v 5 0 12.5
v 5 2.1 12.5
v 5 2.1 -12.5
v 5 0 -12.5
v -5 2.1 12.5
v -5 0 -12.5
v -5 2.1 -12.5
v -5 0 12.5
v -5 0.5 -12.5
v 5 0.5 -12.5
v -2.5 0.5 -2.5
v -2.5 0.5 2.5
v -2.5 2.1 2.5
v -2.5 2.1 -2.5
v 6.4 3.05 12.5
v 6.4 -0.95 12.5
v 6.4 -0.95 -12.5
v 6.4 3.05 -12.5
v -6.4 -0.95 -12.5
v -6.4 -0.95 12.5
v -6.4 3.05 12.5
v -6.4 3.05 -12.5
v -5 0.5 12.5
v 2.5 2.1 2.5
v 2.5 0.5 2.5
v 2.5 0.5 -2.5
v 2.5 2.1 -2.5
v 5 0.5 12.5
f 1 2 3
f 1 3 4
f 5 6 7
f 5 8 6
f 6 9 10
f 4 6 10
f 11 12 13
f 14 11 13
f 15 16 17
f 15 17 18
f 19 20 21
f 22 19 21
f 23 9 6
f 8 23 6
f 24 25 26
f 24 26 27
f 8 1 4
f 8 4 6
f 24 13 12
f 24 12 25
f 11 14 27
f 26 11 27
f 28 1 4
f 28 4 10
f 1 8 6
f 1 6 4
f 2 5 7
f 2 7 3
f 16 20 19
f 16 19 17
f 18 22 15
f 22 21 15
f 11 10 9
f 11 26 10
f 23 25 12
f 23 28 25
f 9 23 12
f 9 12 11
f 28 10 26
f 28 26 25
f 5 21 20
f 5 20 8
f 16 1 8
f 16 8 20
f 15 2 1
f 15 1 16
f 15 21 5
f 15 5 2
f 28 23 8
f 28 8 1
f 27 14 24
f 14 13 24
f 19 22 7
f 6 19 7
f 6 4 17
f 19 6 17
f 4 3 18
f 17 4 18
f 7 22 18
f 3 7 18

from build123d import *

# Parameters (mm, degrees)
F1_DEPTH = 12.5
F0_W     = 5
F0_H     = 1.6
F2_DEPTH = 2.5
F3_W     = 12.8
F3_H     = 4
F4_DEPTH = 12.5


with BuildPart() as f1:
    # F0 (on Top) → F1 (new body, symmetric)
    with BuildSketch(Plane.XY):
        Polygon((-2.5, 0.5), (-5, 0.5), (-5, 0), (5, 0), (5, 0.5), (2.5, 0.5), align=None)
    extrude(amount=F1_DEPTH, both=True)

    # F0 (on Top) → F2 (join, symmetric)
    with BuildSketch(Plane.XY):
        with Locations((0, 1.3)):
            Rectangle(F0_W, F0_H)
    extrude(amount=F2_DEPTH, both=True)


with BuildPart() as f4:
    # F3 (on Top) → F4 (new body, symmetric)
    with BuildSketch(Plane.XY):
        with Locations((0, 1.05)):
            Rectangle(F3_W, F3_H)
        Polygon((-5, 1.05), (-5, 2.1), (5, 2.1), (5, 1.05), (5, 0), (-5, 0), align=None, mode=Mode.SUBTRACT)
    extrude(amount=F4_DEPTH, both=True)


solid = Compound([f1.part, f4.part])
